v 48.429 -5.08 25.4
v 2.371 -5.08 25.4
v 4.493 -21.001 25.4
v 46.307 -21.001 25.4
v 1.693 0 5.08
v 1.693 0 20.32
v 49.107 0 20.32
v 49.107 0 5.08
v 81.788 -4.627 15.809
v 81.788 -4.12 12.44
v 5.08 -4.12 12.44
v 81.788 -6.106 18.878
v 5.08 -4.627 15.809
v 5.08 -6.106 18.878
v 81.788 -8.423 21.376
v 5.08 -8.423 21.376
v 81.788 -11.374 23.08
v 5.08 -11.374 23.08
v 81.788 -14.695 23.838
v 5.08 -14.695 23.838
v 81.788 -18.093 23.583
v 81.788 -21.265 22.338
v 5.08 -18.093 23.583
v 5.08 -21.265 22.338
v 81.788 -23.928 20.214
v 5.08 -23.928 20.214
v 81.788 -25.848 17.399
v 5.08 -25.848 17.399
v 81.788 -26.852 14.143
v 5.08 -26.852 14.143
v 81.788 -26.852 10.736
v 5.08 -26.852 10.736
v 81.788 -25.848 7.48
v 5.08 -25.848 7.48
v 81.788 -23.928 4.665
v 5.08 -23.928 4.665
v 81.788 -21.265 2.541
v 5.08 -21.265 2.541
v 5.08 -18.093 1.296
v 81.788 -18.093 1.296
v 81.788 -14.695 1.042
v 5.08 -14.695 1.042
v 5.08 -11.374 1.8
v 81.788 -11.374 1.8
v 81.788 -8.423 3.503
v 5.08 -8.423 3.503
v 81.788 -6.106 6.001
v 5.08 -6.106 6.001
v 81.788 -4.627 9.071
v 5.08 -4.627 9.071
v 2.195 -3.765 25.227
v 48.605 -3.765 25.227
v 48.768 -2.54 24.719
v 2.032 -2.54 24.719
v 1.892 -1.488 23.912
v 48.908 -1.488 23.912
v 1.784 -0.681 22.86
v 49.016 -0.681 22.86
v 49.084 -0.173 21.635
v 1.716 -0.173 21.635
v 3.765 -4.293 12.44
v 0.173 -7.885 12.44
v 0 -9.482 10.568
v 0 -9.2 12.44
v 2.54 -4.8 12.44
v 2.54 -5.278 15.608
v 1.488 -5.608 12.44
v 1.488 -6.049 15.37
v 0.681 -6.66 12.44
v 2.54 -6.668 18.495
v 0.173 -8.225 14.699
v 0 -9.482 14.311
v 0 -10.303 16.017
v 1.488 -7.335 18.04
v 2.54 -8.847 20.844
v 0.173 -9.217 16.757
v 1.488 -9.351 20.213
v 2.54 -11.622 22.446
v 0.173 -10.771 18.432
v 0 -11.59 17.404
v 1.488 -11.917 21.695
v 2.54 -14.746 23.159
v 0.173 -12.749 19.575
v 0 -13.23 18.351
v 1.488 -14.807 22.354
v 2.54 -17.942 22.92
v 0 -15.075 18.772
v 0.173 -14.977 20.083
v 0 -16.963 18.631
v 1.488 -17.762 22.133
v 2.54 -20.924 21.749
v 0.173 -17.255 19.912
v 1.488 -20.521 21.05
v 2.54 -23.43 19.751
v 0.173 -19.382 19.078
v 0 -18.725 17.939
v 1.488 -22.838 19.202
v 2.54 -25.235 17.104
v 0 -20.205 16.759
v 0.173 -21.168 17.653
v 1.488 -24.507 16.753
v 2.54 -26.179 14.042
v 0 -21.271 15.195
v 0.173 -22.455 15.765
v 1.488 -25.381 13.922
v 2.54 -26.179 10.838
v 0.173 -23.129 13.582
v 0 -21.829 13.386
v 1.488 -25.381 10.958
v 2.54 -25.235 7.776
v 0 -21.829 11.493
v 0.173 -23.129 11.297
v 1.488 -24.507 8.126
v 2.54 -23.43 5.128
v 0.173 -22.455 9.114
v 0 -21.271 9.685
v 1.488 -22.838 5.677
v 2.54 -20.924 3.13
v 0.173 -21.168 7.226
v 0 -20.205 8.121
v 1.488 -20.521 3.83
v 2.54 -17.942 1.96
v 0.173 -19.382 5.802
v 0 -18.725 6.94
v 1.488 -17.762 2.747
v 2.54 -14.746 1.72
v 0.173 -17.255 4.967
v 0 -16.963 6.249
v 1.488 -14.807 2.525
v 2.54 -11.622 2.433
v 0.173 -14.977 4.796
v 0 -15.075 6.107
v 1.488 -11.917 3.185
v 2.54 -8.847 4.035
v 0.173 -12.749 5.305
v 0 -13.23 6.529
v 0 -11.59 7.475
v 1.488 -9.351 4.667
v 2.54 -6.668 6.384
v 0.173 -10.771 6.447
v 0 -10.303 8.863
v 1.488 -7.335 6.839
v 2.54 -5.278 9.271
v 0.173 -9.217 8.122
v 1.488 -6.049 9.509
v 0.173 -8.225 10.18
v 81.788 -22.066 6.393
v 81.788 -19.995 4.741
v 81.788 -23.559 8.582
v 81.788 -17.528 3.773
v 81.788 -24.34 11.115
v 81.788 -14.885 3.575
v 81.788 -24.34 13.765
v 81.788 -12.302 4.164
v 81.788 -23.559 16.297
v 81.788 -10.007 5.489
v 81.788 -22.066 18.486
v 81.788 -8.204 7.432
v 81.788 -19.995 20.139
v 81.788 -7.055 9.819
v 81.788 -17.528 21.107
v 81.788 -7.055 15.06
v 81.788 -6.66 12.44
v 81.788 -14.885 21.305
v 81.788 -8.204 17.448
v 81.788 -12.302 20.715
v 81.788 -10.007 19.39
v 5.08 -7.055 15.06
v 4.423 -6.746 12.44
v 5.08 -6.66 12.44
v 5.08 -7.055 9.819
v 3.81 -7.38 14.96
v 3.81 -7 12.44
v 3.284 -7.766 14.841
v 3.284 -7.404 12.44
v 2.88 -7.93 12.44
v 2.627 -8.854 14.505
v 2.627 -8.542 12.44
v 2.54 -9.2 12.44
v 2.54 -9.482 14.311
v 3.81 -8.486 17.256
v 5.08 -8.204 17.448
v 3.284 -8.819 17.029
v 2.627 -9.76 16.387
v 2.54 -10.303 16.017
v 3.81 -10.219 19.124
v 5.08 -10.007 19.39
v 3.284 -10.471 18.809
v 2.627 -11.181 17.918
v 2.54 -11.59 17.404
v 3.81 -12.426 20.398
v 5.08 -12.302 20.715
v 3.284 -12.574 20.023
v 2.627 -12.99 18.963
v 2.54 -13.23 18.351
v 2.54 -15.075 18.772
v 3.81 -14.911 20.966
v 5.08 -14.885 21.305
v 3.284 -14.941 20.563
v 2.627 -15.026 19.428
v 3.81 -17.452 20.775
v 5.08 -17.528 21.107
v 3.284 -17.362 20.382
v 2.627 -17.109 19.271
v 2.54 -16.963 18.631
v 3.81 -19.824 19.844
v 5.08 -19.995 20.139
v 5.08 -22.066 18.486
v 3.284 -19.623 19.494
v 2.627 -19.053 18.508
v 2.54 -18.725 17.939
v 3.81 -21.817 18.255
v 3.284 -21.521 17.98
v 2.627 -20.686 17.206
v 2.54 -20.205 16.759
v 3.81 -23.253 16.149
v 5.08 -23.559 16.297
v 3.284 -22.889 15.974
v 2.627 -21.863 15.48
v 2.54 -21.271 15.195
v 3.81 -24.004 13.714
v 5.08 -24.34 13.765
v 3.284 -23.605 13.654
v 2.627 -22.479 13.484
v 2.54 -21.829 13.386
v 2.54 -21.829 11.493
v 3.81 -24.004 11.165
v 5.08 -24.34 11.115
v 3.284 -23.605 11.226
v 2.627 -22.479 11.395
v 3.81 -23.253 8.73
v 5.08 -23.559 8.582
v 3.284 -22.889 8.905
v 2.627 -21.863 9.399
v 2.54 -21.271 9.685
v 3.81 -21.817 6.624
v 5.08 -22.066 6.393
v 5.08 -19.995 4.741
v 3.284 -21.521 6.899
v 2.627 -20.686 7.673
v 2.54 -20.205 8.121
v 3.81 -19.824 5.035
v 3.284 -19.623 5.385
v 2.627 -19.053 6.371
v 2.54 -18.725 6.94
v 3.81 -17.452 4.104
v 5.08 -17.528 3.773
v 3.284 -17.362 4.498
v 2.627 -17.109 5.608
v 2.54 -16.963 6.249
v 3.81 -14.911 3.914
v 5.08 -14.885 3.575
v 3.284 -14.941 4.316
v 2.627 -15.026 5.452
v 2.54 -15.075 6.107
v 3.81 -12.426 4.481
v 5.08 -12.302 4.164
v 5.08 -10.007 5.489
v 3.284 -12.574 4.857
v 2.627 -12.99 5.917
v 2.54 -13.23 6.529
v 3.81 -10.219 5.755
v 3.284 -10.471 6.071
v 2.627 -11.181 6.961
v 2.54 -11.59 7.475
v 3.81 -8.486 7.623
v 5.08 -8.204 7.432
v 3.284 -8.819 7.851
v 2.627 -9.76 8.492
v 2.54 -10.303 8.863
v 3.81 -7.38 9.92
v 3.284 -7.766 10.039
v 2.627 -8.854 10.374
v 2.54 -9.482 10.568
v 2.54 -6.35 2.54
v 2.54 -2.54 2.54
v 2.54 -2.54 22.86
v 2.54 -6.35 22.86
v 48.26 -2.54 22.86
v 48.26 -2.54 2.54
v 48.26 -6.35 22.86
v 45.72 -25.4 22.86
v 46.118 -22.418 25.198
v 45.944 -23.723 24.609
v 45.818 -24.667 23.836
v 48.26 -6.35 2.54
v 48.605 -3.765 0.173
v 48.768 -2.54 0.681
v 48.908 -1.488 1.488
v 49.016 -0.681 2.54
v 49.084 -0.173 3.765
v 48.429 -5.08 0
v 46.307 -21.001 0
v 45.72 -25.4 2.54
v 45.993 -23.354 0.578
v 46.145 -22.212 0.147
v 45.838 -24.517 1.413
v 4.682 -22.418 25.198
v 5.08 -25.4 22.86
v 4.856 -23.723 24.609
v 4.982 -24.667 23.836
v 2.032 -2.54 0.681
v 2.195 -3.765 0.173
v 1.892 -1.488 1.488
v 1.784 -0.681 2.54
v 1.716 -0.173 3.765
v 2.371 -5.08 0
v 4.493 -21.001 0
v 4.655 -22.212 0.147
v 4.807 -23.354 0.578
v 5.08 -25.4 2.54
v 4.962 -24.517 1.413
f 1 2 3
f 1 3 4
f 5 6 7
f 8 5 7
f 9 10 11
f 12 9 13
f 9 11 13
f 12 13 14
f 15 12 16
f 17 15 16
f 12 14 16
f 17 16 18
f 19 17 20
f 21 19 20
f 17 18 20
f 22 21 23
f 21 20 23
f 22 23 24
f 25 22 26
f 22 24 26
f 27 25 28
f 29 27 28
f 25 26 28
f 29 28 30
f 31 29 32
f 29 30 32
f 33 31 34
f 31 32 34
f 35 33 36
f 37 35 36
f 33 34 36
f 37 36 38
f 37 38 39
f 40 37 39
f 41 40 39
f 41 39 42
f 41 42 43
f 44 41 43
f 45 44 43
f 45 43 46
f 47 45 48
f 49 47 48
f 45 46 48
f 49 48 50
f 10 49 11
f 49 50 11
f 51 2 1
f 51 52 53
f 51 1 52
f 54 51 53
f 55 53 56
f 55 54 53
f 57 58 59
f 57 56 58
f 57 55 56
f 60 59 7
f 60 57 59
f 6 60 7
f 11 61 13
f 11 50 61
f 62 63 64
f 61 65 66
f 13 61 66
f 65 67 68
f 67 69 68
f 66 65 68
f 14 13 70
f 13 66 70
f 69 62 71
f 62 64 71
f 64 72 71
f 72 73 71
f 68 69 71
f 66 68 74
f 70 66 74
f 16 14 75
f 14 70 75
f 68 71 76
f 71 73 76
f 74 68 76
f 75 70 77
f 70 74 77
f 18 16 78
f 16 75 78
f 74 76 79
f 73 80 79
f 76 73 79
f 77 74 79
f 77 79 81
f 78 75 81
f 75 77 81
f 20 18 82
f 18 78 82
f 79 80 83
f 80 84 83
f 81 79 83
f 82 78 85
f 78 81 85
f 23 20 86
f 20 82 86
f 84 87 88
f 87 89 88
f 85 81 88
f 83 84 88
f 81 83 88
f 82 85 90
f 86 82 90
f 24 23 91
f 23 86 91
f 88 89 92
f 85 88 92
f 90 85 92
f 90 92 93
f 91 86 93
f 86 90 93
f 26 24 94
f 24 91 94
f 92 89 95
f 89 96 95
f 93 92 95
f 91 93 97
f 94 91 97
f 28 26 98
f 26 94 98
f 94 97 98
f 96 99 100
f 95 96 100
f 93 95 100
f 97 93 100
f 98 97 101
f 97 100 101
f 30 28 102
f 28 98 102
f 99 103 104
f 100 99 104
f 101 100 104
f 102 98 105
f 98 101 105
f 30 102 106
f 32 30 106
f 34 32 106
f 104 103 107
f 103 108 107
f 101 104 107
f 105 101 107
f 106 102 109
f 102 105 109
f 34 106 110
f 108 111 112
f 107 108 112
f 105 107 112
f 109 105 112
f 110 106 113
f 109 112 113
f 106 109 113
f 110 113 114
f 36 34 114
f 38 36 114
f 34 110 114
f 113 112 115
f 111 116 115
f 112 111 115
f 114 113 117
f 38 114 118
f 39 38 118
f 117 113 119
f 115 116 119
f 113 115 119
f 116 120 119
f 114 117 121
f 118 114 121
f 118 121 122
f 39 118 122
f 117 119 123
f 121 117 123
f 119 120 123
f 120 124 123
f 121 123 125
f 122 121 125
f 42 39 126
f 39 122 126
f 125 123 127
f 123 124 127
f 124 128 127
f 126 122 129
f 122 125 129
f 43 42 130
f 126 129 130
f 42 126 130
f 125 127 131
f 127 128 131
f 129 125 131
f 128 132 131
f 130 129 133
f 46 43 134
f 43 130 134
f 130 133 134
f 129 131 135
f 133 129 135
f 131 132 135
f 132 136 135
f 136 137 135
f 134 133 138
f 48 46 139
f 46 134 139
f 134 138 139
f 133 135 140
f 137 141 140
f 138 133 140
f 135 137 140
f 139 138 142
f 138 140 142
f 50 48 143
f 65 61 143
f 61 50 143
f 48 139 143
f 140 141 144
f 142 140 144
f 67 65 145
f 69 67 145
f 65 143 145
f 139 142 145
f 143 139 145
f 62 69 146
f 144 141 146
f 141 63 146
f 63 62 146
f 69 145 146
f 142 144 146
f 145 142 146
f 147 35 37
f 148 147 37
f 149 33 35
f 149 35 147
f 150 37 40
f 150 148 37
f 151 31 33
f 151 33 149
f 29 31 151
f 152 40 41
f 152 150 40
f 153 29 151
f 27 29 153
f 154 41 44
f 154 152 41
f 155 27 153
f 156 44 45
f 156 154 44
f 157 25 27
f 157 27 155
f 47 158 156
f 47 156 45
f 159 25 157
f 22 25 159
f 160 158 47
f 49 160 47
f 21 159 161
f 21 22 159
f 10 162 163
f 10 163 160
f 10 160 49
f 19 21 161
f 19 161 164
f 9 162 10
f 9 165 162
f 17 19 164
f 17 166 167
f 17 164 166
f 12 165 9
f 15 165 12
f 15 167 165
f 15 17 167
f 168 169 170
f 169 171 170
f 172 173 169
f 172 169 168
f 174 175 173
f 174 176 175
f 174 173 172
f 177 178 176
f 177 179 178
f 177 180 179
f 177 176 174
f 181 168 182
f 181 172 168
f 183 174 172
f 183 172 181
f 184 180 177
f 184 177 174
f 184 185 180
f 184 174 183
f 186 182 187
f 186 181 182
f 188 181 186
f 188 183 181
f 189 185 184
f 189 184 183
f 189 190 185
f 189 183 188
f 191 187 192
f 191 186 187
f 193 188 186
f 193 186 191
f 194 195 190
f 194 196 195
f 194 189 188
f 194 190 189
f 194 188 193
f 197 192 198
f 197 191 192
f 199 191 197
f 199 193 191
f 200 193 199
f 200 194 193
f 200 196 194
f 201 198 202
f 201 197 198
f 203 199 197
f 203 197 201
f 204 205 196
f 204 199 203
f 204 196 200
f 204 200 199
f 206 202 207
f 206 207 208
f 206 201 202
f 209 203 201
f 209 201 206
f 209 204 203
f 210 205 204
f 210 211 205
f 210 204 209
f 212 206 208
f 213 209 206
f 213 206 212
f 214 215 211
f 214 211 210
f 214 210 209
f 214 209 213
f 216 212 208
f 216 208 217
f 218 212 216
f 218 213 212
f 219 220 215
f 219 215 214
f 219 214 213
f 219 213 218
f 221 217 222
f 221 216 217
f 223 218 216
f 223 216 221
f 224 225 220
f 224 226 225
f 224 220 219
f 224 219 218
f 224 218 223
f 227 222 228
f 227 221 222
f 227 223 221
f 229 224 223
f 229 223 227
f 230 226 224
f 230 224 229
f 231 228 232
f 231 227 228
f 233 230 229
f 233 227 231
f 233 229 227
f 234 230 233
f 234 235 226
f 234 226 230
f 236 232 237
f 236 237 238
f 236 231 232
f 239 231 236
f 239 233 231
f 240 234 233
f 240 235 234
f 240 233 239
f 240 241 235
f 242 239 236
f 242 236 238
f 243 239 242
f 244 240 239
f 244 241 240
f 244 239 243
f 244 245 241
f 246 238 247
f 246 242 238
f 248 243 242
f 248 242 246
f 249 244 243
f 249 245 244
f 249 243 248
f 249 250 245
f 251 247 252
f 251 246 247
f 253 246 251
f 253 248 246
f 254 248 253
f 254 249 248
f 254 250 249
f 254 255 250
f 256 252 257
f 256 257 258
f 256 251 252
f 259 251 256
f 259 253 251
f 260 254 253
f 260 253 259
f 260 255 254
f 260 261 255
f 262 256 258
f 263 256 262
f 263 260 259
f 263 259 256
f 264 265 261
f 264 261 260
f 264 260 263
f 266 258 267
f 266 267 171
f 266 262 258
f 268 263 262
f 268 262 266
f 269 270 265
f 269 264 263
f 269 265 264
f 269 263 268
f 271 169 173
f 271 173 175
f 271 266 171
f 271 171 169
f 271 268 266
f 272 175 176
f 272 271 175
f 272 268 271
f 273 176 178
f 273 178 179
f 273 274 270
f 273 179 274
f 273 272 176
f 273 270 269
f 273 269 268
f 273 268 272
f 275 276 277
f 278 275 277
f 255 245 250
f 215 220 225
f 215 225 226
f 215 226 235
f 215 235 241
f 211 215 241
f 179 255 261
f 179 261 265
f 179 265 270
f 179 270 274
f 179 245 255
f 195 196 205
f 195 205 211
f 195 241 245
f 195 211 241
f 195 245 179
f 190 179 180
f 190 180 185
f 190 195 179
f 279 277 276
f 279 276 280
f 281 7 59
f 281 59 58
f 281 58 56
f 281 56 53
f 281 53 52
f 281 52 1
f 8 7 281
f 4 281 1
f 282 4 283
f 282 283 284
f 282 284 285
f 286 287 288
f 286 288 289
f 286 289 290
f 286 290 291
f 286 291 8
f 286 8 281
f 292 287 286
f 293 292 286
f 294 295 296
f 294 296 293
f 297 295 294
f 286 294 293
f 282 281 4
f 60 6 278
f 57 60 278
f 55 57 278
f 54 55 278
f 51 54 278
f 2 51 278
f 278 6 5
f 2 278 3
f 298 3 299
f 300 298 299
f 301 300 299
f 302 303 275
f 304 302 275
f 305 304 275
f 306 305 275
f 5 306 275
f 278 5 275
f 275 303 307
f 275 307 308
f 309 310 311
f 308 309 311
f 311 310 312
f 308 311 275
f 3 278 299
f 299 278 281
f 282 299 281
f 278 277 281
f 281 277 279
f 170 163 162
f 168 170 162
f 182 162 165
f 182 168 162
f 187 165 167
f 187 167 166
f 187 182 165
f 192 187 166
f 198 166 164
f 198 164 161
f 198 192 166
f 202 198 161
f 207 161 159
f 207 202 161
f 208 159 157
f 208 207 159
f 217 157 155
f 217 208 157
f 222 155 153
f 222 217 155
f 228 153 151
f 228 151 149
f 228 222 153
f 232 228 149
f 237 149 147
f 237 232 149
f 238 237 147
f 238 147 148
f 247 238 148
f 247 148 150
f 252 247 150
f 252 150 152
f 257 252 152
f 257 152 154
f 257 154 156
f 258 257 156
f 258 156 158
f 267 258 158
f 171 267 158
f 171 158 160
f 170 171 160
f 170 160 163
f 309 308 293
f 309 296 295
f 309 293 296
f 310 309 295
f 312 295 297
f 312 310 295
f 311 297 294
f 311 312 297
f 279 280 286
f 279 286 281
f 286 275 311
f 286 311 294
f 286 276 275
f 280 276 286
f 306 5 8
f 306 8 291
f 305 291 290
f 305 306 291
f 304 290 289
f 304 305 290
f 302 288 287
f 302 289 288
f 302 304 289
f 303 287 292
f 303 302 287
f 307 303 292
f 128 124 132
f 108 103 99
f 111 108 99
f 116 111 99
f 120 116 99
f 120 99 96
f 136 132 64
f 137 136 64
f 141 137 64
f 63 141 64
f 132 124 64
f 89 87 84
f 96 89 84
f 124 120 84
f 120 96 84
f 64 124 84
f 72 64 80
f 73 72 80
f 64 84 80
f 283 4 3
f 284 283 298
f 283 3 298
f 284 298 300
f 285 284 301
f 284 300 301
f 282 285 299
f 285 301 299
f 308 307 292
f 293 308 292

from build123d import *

# Parameters (mm, degrees)
F0_W        = 50.8
F0_H        = 25.4
F1_DEPTH    = 25.4
F2_T        = -2.54
F3_T1_DEPTH = 223.4557170743
F4_T1_DEPTH = 72.8133333333
F4_T3_DEPTH = 62.6370452561
F5_R        = 11.43
F6_DEPTH    = 81.788
F7_R        = 5.08
F8_T        = -2.54


# Not quite as in the source:
# - a fillet or chamfer that OpenCascade refuses, or shapes differently, is made with other operations: its cross-section is extruded or revolved along the edge and cut away or added


with BuildPart() as f1:
    # F0 (on Front) → F1 (new body)
    with BuildSketch(Plane.XZ):
        with Locations((25.4, 12.7)):
            Rectangle(F0_W, F0_H)
    extrude(amount=F1_DEPTH)

    # F2
    f2_openings = [f1.faces().sort_by_distance(p)[0] for p in [
        (25.4, -25.4, 12.7),
    ]]
    offset(amount=F2_T, openings=f2_openings)

    # F3: chamfer of 5.08 x 38.1 on 2 edges, made by hand

    # F3_s2 → F3_t1 (cut)
    with BuildSketch(Plane.XY.offset(-99.0278585372)):
        Polygon((50.8, 12.7), (45.72, -25.4), (50.8, -25.4), align=None)
        Polygon((0, 12.7), (5.08, -25.4), (0, -25.4), align=None)
    extrude(amount=F3_T1_DEPTH, mode=Mode.SUBTRACT)

    # F4: fillet of radius 5.08 on 4 edges, made by hand

    # F4_s2 → F4_t1 (cut)
    with BuildSketch(Plane.YZ.offset(-11.0066666667)):
        with BuildLine():
            ThreePointArc((-5.08, 25.4), (-1.4878975516, 23.9121024484), (0, 20.32))
            Line((0, 20.32), (0, 25.4))
            Line((0, 25.4), (-5.08, 25.4))
        make_face()
        with BuildLine():
            ThreePointArc((0, 5.08), (-1.4878975516, 1.4878975516), (-5.08, 0))
            Line((-5.08, 0), (0, 0))
            Line((0, 0), (0, 5.08))
        make_face()
    extrude(amount=F4_T1_DEPTH, mode=Mode.SUBTRACT)

    # F4_s4 → F4_t3 (cut)
    with BuildSketch(Plane.YZ.offset(-5.9185226281)):
        with BuildLine():
            ThreePointArc((-21.0005909488, 0), (-23.5405909488, 0.6805909488), (-25.4, 2.54))
            Line((-25.4, 2.54), (-25.4, 0))
            Line((-25.4, 0), (-21.0005909488, 0))
        make_face()
        with BuildLine():
            ThreePointArc((-21.0005909488, 25.4), (-23.5405909488, 24.7194090512), (-25.4, 22.86))
            Line((-25.4, 22.86), (-25.4, 25.4))
            Line((-25.4, 25.4), (-21.0005909488, 25.4))
        make_face()
    extrude(amount=F4_T3_DEPTH, mode=Mode.SUBTRACT)


with BuildPart() as f6:
    # F5 (on Right) → F6 (new body)
    with BuildSketch(Plane.YZ):
        with Locations((-15.5496466905, 12.4397175387)):
            Circle(F5_R)
    extrude(amount=F6_DEPTH)

    # F7
    f7_edges = [f6.edges().sort_by_distance(p)[0] for p in [
        (0, -26.979647, 12.439718),
    ]]
    fillet(f7_edges, radius=F7_R)

    # F8
    f8_openings = [f6.faces().sort_by_distance(p)[0] for p in [
        (81.788, -15.549647, 12.439718),
    ]]
    offset(amount=F8_T, openings=f8_openings)


solid = Compound([f1.part, f6.part])
